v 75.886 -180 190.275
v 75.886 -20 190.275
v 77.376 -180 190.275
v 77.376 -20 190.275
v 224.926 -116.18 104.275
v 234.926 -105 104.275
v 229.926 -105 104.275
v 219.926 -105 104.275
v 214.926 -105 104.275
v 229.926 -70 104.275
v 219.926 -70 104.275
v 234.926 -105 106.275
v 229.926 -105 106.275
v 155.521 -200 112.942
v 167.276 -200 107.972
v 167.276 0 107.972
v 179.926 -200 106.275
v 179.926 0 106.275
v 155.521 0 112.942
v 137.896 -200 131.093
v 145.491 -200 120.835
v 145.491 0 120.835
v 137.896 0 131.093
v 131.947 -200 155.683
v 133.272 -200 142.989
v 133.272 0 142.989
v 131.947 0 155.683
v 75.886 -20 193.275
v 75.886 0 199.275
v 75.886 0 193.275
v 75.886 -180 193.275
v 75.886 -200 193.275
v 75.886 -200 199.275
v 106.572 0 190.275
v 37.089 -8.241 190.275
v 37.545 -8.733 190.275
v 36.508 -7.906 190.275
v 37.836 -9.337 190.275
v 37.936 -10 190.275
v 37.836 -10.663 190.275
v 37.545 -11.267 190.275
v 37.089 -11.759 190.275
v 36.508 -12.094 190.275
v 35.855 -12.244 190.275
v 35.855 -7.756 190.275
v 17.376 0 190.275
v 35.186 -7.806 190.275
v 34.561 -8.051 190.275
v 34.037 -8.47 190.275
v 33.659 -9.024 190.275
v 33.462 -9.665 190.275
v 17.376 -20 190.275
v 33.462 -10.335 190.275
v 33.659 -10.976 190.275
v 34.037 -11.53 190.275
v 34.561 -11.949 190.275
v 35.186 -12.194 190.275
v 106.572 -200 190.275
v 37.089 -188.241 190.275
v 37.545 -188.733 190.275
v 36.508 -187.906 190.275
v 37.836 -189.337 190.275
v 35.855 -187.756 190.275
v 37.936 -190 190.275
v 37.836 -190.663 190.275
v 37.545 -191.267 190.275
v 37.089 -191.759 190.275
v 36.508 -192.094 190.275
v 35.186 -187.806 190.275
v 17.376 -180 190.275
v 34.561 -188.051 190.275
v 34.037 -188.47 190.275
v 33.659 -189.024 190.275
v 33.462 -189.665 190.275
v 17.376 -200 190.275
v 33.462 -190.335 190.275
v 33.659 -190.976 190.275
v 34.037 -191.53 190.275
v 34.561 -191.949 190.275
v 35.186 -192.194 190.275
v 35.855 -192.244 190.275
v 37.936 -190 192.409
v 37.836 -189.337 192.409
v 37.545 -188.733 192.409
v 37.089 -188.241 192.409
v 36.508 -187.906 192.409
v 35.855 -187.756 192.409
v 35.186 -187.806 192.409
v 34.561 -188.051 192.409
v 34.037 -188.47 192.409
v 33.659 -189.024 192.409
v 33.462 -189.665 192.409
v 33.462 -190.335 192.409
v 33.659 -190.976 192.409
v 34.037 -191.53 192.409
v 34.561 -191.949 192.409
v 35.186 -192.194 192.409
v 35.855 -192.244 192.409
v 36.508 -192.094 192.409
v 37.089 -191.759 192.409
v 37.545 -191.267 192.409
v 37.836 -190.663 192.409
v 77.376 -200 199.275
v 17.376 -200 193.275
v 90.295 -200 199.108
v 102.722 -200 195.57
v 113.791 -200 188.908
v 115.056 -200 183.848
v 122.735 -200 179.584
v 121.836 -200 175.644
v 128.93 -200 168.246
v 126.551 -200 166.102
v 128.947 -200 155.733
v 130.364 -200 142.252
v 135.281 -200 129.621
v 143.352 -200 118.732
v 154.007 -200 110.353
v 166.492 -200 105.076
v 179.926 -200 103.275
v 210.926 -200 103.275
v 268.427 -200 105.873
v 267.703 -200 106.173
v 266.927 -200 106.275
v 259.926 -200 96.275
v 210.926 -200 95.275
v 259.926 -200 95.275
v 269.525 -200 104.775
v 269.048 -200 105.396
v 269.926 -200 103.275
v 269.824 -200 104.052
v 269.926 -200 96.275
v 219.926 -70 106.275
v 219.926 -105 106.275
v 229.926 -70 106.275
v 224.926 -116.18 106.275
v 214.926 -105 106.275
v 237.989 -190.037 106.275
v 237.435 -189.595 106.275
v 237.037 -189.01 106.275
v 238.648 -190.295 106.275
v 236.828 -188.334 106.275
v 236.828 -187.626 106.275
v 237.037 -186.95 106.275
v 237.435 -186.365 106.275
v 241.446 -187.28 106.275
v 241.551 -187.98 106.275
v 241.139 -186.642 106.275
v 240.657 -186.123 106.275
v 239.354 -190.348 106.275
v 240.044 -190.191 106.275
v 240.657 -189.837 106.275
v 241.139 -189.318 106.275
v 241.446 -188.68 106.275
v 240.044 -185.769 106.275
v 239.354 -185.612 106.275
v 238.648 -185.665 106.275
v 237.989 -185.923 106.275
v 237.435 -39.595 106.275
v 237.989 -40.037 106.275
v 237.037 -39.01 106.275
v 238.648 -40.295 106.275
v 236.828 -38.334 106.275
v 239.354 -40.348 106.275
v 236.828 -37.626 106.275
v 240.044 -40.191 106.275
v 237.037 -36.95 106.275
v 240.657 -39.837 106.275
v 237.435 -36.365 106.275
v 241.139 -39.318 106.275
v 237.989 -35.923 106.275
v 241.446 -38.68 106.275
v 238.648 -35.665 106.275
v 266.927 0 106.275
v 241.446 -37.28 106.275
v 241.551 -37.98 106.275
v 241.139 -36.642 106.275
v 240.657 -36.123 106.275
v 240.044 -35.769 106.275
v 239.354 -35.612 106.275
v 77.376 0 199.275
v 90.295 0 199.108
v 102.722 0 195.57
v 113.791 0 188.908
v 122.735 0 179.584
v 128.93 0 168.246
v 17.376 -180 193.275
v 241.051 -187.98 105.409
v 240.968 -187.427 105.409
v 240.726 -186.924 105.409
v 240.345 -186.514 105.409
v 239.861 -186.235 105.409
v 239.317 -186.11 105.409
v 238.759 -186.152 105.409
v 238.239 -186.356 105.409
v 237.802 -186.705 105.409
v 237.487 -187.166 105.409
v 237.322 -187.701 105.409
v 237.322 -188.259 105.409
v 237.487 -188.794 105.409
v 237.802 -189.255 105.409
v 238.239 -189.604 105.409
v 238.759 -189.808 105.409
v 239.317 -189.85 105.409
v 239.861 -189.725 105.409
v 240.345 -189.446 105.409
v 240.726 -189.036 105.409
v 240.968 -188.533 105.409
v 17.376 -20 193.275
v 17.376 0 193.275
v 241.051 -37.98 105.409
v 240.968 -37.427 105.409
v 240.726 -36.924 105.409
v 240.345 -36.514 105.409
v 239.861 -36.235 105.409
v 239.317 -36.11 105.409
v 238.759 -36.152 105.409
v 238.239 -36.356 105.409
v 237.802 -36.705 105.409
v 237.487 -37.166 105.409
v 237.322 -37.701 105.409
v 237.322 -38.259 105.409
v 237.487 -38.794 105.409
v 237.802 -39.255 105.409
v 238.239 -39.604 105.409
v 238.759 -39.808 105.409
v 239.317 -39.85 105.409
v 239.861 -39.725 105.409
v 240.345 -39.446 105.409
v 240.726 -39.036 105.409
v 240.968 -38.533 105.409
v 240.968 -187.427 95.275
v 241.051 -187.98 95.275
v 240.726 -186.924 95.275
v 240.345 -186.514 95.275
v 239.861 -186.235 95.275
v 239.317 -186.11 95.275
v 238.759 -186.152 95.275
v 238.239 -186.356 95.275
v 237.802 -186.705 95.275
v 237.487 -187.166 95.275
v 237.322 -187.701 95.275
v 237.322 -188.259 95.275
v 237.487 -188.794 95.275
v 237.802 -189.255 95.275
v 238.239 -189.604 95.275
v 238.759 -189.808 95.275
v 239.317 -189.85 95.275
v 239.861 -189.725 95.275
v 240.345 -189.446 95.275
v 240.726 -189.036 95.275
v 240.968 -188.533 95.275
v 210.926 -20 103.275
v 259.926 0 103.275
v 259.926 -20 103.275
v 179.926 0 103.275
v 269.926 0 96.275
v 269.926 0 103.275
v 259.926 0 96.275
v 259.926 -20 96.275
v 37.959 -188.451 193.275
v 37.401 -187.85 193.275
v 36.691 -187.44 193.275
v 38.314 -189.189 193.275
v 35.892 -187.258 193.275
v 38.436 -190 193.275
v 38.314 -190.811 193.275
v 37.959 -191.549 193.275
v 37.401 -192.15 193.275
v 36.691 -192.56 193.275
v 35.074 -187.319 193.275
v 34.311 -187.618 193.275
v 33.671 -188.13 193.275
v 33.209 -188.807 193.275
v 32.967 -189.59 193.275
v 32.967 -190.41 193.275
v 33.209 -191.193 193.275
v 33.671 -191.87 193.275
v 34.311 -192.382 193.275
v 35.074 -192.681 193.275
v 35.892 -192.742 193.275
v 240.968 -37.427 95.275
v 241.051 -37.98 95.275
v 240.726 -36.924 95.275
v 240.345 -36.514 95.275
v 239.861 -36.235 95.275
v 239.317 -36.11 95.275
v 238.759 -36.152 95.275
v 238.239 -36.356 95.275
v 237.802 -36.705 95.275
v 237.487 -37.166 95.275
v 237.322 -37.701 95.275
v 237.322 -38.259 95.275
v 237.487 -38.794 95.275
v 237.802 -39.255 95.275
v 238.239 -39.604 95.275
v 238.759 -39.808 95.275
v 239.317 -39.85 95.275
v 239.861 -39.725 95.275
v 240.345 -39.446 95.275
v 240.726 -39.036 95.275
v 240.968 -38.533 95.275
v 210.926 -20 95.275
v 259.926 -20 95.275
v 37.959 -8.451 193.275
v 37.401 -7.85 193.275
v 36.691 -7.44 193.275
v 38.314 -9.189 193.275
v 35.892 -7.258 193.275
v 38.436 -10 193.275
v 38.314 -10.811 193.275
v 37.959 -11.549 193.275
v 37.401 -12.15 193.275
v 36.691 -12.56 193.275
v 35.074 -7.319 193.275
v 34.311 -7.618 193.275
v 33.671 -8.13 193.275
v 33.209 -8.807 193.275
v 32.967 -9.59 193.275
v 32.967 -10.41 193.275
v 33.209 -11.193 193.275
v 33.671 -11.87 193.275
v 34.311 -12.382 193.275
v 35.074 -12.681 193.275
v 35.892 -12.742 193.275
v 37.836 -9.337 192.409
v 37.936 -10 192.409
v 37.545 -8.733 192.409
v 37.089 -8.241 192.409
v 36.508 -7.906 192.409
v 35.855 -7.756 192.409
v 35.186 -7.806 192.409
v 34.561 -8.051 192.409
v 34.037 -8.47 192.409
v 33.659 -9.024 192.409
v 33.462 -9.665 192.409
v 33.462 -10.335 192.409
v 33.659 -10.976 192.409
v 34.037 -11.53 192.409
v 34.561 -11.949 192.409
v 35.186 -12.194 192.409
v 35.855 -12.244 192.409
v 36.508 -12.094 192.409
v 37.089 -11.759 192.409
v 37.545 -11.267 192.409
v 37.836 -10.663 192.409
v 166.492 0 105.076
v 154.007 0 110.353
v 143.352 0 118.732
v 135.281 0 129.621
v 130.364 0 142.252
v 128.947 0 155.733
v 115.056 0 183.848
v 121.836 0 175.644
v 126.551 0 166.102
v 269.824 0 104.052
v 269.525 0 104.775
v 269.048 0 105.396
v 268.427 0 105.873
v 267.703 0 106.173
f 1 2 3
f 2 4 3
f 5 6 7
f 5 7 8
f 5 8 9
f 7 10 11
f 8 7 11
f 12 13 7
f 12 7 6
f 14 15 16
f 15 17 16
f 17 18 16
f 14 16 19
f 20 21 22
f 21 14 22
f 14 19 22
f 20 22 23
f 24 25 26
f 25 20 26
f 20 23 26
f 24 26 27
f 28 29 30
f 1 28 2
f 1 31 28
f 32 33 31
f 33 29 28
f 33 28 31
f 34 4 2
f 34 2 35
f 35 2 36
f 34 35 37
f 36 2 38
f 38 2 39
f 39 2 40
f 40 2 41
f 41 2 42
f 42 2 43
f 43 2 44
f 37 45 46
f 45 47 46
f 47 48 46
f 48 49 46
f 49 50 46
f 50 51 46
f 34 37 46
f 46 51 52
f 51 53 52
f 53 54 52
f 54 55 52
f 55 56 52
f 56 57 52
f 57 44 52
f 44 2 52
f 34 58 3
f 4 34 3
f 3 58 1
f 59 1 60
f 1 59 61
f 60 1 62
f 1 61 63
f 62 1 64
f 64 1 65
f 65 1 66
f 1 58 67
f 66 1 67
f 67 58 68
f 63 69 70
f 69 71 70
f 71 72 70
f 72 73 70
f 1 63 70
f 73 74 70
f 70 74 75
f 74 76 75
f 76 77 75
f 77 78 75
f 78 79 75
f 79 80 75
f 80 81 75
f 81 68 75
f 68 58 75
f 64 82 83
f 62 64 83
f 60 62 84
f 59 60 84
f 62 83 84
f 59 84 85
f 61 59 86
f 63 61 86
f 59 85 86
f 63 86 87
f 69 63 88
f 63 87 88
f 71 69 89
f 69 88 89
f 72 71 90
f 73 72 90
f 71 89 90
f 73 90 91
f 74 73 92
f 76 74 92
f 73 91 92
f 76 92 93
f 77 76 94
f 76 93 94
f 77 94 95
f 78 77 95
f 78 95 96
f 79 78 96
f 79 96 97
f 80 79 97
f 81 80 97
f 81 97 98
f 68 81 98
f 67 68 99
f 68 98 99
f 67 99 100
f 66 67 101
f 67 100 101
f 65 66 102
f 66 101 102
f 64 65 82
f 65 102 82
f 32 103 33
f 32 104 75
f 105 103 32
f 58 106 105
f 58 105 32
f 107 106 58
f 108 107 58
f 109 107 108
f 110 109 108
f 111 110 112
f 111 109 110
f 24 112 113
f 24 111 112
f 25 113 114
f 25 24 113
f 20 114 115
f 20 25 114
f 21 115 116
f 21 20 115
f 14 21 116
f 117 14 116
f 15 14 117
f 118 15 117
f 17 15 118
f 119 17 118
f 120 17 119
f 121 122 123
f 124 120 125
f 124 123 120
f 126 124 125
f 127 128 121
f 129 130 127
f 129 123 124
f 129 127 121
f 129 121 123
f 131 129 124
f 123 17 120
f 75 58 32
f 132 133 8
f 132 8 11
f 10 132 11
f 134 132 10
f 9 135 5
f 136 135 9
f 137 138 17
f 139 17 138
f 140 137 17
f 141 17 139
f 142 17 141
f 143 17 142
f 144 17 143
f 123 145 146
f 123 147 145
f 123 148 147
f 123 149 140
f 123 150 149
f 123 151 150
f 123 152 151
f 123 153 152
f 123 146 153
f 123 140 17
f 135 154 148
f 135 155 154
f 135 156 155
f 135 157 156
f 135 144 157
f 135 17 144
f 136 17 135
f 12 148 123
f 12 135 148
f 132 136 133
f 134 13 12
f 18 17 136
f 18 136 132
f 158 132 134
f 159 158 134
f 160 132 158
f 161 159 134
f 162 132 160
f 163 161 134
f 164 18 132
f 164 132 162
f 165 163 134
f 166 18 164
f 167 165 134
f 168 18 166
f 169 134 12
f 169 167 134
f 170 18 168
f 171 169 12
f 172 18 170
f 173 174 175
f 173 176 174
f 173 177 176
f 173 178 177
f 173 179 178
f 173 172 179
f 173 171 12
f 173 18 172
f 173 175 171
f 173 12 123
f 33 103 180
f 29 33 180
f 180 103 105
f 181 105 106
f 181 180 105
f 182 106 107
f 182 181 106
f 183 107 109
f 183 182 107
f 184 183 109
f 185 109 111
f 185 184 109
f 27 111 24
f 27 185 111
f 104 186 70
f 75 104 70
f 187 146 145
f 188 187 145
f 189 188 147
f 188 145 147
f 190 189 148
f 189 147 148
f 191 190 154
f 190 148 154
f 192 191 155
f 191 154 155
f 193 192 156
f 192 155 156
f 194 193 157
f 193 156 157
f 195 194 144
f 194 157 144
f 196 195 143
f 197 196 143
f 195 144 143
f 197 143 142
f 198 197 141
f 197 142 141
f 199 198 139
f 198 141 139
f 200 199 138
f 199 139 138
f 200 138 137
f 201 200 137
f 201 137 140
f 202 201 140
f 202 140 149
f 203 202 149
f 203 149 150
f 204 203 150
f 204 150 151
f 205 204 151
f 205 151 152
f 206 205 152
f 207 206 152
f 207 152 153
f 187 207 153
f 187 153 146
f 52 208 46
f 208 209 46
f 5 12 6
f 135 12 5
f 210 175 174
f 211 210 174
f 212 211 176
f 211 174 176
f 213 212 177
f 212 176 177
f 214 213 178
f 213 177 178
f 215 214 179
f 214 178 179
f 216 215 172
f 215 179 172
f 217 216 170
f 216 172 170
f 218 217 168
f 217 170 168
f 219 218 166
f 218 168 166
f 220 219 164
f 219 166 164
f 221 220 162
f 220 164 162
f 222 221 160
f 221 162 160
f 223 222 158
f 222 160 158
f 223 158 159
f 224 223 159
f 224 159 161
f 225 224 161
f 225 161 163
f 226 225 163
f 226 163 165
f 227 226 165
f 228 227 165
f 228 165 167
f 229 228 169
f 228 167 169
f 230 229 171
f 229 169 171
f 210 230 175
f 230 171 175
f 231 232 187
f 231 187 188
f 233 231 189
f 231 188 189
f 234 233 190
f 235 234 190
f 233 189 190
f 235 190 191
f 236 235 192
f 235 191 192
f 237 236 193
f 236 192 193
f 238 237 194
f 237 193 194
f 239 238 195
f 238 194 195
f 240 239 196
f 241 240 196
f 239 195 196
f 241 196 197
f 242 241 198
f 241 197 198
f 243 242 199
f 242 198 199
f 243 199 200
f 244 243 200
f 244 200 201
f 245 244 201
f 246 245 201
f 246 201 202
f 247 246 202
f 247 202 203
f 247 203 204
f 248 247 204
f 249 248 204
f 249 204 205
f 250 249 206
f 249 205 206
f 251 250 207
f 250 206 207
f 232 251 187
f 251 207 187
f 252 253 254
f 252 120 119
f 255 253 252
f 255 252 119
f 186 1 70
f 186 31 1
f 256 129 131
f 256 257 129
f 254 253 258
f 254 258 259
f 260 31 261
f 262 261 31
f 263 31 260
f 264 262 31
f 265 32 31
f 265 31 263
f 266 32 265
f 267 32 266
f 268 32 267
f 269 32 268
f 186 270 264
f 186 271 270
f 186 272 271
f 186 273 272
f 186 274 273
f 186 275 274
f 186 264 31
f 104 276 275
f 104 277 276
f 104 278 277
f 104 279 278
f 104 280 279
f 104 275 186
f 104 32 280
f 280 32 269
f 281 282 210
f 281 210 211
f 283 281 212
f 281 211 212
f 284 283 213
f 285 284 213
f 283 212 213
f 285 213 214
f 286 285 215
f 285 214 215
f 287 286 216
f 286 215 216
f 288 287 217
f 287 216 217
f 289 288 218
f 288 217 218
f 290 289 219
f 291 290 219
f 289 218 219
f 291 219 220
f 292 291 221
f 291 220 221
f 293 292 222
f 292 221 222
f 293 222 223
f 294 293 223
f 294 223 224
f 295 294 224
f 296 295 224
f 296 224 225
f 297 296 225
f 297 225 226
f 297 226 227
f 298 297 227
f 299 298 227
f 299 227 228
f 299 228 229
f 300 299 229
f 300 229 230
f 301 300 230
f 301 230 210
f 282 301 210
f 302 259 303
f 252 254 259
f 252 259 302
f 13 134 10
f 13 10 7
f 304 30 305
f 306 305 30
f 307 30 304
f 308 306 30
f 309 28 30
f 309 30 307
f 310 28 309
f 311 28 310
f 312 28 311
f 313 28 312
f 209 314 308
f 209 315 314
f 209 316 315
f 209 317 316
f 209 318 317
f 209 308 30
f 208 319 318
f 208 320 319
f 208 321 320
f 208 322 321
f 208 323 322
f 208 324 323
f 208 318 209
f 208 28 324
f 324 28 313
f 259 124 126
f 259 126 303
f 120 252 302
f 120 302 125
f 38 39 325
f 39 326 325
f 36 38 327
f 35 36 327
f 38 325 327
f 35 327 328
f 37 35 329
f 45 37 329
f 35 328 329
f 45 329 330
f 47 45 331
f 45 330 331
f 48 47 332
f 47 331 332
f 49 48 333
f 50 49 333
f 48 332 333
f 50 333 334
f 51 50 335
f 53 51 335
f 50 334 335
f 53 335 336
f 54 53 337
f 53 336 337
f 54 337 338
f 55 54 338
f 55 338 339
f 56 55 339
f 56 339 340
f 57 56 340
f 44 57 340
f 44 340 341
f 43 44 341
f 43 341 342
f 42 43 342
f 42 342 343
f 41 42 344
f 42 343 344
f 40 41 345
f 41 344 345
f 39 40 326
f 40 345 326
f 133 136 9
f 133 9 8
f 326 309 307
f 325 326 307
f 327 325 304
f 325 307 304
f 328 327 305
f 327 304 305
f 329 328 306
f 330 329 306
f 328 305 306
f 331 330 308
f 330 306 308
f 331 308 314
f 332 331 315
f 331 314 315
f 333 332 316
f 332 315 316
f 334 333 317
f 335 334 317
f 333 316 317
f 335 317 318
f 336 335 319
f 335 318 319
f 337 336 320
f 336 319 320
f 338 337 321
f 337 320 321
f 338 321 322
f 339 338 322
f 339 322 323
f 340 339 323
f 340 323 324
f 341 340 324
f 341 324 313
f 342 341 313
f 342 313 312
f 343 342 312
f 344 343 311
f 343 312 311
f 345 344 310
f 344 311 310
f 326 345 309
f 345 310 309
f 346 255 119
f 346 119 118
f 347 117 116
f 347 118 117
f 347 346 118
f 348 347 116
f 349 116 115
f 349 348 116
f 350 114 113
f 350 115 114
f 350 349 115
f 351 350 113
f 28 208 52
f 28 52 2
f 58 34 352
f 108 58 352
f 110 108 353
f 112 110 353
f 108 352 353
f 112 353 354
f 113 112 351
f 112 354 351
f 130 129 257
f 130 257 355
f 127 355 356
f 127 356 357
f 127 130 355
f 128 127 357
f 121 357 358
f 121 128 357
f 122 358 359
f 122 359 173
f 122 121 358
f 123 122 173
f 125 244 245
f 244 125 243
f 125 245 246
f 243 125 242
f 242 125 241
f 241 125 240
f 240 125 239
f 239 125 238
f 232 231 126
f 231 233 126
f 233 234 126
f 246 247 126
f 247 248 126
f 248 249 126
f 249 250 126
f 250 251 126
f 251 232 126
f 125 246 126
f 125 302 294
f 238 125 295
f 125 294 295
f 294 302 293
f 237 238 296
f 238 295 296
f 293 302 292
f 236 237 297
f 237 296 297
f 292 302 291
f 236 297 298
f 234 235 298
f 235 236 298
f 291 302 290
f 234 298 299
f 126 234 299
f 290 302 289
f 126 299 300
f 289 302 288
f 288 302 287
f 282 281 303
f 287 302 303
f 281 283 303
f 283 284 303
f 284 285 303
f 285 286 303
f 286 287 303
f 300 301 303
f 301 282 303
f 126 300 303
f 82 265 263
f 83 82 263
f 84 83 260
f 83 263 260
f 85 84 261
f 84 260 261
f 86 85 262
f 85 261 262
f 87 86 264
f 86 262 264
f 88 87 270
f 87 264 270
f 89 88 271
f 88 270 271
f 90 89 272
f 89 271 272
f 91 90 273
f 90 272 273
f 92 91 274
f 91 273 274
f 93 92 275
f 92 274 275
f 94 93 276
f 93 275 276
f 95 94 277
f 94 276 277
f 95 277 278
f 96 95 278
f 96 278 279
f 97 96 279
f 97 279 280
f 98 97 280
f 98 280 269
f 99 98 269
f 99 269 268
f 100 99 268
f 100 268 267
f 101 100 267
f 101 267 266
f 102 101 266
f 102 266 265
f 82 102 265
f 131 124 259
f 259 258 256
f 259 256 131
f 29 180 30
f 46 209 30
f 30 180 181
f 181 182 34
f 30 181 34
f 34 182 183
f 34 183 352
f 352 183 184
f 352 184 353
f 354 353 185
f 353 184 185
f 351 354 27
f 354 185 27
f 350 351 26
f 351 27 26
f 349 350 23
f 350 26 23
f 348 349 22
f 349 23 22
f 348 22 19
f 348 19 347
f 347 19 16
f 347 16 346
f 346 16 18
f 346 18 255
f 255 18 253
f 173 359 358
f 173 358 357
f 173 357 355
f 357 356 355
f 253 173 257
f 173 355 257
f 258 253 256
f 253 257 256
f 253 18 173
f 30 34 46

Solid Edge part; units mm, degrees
sketch "Sketch1" plane through (0, 0, 0) normal (0, -1, 0) x (1, 0, 0)
  line L0 (77.3764, 199.2749) -> (17.3764, 199.2749)
  line L1 (17.3764, 199.2749) -> (17.3764, 196.2749)
  line L2 (17.3764, 196.2749) -> (77.3764, 196.2749)
  arc A0 (77.3764, 196.2749) -> (128.9473, 155.7325) centre (83.2091, 150.6232) cw
  arc A1 (128.9473, 155.7325) -> (179.9264, 103.2749) centre (179.9264, 154.2749) ccw
  line L3 (269.9264, 103.2749) -> (179.9264, 103.2749)
  line L4 (269.9264, 106.2749) -> (269.9264, 103.2749)
  line L5 (179.9264, 106.2749) -> (269.9264, 106.2749)
  arc A2 (131.9471, 155.6831) -> (179.9264, 106.2749) centre (179.9264, 154.2749) ccw
  arc A3 (77.3764, 199.2749) -> (131.9471, 155.6831) centre (83.2091, 150.6232) cw
  dimension "D1" = 3
  dimension "D2" = 60
  dimension "D3" = 90
  dimension "D4" = 3
  dimension "D5" = 90
  dimension "D6" = 102.55
  dimension "D7" = 49
  dimension "D8" = 48
  dimension "D9" = 90
extrude "Protrusion1" add sketch "Sketch1" along normal blind 200
fillet "Verrundung_4" radius 3 1 edges at (269.9264, -100, 106.2749)
sketch "Sketch2" plane through (143.6514, -200, 152.9362) normal (0, -1, 0) x (1, 0, 0)
  line L0 (-126.275, 37.3386) -> (-126.275, 43.3386)
  line L1 (-126.275, 43.3386) -> (-126.275, 46.3386)
  line L2 (-126.275, 46.3386) -> (-66.275, 46.3386)
  line L3 (-66.275, 46.3386) -> (-50.0814, 44.2327)
  line L4 (-50.0814, 44.2327) -> (-37.0073, 38.973)
  line L5 (-37.0073, 38.973) -> (-35.5454, 37.3386)
  line L6 (-35.5454, 37.3386) -> (-126.275, 37.3386)
  dimension "D1" = 6
extrude "Protrusion2" add sketch "Sketch2" against normal up to vertex (200 mm away)
sketch "Sketch3" plane through (47.3764, -100, 199.2749) normal (0, 0, 1) x (1, 0, 0)
  circle A0 centre (-11.69, 90) radius 2.25
  circle A1 centre (-11.69, -90) radius 2.25
  dimension "D1" = 10
  dimension "D2" = 4.5
  dimension "D3" = 18.31
  dimension "D4" = 10
extrude "Cutout1" cut sketch "Sketch3" against normal through all
sketch "Sketch4" plane through (143.6514, -200, 151.449) normal (0, -1, 0) x (1, 0, 0)
  line L0 (-126.275, 47.8258) -> (-66.275, 47.8258)
  line L1 (-66.275, 47.8258) -> (-66.275, 41.8258)
  line L2 (-66.275, 41.8258) -> (-126.275, 41.8258)
  line L3 (-126.275, 41.8258) -> (-126.275, 47.8258)
extrude "Cutout2" cut sketch "Sketch4" against normal through all
sketch "Sketch5" plane through (224.9264, -100, 103.2749) normal (0, 0, -1) x (1, 0, 0)
  line L0 (-14, 100) -> (35, 100)
  line L1 (35, 100) -> (35, -80)
  line L2 (35, -80) -> (-14, -80)
  line L3 (-14, -80) -> (-14, 100)
  dimension "D1" = 20
  dimension "D2" = 49
  dimension "D3" = 10
extrude "Extrusionsausprägung_3" add sketch "Sketch5" along normal blind 8
sketch "Sketch6" plane through (47.3764, -100, 193.2749) normal (0, 0, 1) x (1, 0, 0)
  line L0 (-30, 80) -> (30, 80)
  line L1 (30, 80) -> (30, -80)
  line L2 (30, -80) -> (-30, -80)
  line L3 (-30, -80) -> (-30, 80)
  dimension "D1" = 160
extrude "Cutout3" cut sketch "Sketch6" against normal through all
sketch "Sketch7" plane through (223.4264, -100, 106.2749) normal (0, 0, 1) x (1, 0, 0)
  circle A0 centre (15.75, 62.02) radius 1.875
  circle A1 centre (15.75, -87.98) radius 1.875
  dimension "D1" = 30.75
  dimension "D2" = 150
  dimension "D3" = 37.98
  dimension "D4" = 3.75
extrude "Cutout4" cut sketch "Sketch7" against normal through all
sketch "Sketch8" plane through (224.9264, -100, 103.2749) normal (0, 0, -1) x (1, 0, 0)
  line L0 (35, 100) -> (45, 100)
  line L1 (45, 100) -> (45, -100)
  line L2 (45, -100) -> (35, -100)
  line L3 (35, -100) -> (35, 100)
extrude "Extrusionsausprägung_4" add sketch "Sketch8" along normal blind 7
sketch "Sketch9" plane through (77.3764, -100, 194.7749) normal (-1, 0, 0) x (0, -1, 0)
  line L0 (-100, 4.5) -> (-100, -1.5)
  line L1 (-100, -1.5) -> (-80, -1.5)
  line L2 (-80, -1.5) -> (-80, -4.5)
  line L3 (-80, -4.5) -> (80, -4.5)
  line L4 (80, -4.5) -> (80, -1.5)
  line L5 (80, -1.5) -> (100, -1.5)
  line L6 (100, -1.5) -> (100, 4.5)
  line L7 (100, 4.5) -> (-100, 4.5)
extrude "Extrusionsausprägung_5" add sketch "Sketch9" along normal blind 1.49
sketch "Sketch10" plane through (223.4264, -100, 106.2749) normal (0, 0, 1) x (1, 0, 0)
  line L0 (-3.5, 30) -> (6.5, 30)
  line L1 (6.5, 30) -> (6.5, -5)
  line L2 (6.5, -5) -> (11.5, -5)
  line L3 (11.5, -5) -> (1.5, -16.1803)
  line L4 (1.5, -16.1803) -> (-8.5, -5)
  line L5 (-8.5, -5) -> (-3.5, -5)
  line L6 (-3.5, -5) -> (-3.5, 30)
  dimension "D1" = 10
  dimension "D2" = 35
  dimension "D3" = 5
  dimension "D4" = 15
  dimension "D5" = 45
  dimension "D6" = 70
extrude "Extrusionsausschnitt_7" cut sketch "Sketch10" against normal blind 2
chamfer "Fase_1" distance 0.5 angle 60 4 edges at (33.4364, -10, 193.2749) (33.4364, -190, 193.2749) (237.3014, -37.98, 106.2749) (237.3014, -187.98, 106.2749) measured on face at (66.7198, -183.5333, 193.2748) measured on face at (66.7198, -3.5333, 193.2748) measured on face at (66.7198, -183.5333, 193.2748) measured on face at (66.7198, -3.5333, 193.2748) measured on face at (193.5564, -164.6667, 106.2749)
properties material "Nylon, allgemein"
